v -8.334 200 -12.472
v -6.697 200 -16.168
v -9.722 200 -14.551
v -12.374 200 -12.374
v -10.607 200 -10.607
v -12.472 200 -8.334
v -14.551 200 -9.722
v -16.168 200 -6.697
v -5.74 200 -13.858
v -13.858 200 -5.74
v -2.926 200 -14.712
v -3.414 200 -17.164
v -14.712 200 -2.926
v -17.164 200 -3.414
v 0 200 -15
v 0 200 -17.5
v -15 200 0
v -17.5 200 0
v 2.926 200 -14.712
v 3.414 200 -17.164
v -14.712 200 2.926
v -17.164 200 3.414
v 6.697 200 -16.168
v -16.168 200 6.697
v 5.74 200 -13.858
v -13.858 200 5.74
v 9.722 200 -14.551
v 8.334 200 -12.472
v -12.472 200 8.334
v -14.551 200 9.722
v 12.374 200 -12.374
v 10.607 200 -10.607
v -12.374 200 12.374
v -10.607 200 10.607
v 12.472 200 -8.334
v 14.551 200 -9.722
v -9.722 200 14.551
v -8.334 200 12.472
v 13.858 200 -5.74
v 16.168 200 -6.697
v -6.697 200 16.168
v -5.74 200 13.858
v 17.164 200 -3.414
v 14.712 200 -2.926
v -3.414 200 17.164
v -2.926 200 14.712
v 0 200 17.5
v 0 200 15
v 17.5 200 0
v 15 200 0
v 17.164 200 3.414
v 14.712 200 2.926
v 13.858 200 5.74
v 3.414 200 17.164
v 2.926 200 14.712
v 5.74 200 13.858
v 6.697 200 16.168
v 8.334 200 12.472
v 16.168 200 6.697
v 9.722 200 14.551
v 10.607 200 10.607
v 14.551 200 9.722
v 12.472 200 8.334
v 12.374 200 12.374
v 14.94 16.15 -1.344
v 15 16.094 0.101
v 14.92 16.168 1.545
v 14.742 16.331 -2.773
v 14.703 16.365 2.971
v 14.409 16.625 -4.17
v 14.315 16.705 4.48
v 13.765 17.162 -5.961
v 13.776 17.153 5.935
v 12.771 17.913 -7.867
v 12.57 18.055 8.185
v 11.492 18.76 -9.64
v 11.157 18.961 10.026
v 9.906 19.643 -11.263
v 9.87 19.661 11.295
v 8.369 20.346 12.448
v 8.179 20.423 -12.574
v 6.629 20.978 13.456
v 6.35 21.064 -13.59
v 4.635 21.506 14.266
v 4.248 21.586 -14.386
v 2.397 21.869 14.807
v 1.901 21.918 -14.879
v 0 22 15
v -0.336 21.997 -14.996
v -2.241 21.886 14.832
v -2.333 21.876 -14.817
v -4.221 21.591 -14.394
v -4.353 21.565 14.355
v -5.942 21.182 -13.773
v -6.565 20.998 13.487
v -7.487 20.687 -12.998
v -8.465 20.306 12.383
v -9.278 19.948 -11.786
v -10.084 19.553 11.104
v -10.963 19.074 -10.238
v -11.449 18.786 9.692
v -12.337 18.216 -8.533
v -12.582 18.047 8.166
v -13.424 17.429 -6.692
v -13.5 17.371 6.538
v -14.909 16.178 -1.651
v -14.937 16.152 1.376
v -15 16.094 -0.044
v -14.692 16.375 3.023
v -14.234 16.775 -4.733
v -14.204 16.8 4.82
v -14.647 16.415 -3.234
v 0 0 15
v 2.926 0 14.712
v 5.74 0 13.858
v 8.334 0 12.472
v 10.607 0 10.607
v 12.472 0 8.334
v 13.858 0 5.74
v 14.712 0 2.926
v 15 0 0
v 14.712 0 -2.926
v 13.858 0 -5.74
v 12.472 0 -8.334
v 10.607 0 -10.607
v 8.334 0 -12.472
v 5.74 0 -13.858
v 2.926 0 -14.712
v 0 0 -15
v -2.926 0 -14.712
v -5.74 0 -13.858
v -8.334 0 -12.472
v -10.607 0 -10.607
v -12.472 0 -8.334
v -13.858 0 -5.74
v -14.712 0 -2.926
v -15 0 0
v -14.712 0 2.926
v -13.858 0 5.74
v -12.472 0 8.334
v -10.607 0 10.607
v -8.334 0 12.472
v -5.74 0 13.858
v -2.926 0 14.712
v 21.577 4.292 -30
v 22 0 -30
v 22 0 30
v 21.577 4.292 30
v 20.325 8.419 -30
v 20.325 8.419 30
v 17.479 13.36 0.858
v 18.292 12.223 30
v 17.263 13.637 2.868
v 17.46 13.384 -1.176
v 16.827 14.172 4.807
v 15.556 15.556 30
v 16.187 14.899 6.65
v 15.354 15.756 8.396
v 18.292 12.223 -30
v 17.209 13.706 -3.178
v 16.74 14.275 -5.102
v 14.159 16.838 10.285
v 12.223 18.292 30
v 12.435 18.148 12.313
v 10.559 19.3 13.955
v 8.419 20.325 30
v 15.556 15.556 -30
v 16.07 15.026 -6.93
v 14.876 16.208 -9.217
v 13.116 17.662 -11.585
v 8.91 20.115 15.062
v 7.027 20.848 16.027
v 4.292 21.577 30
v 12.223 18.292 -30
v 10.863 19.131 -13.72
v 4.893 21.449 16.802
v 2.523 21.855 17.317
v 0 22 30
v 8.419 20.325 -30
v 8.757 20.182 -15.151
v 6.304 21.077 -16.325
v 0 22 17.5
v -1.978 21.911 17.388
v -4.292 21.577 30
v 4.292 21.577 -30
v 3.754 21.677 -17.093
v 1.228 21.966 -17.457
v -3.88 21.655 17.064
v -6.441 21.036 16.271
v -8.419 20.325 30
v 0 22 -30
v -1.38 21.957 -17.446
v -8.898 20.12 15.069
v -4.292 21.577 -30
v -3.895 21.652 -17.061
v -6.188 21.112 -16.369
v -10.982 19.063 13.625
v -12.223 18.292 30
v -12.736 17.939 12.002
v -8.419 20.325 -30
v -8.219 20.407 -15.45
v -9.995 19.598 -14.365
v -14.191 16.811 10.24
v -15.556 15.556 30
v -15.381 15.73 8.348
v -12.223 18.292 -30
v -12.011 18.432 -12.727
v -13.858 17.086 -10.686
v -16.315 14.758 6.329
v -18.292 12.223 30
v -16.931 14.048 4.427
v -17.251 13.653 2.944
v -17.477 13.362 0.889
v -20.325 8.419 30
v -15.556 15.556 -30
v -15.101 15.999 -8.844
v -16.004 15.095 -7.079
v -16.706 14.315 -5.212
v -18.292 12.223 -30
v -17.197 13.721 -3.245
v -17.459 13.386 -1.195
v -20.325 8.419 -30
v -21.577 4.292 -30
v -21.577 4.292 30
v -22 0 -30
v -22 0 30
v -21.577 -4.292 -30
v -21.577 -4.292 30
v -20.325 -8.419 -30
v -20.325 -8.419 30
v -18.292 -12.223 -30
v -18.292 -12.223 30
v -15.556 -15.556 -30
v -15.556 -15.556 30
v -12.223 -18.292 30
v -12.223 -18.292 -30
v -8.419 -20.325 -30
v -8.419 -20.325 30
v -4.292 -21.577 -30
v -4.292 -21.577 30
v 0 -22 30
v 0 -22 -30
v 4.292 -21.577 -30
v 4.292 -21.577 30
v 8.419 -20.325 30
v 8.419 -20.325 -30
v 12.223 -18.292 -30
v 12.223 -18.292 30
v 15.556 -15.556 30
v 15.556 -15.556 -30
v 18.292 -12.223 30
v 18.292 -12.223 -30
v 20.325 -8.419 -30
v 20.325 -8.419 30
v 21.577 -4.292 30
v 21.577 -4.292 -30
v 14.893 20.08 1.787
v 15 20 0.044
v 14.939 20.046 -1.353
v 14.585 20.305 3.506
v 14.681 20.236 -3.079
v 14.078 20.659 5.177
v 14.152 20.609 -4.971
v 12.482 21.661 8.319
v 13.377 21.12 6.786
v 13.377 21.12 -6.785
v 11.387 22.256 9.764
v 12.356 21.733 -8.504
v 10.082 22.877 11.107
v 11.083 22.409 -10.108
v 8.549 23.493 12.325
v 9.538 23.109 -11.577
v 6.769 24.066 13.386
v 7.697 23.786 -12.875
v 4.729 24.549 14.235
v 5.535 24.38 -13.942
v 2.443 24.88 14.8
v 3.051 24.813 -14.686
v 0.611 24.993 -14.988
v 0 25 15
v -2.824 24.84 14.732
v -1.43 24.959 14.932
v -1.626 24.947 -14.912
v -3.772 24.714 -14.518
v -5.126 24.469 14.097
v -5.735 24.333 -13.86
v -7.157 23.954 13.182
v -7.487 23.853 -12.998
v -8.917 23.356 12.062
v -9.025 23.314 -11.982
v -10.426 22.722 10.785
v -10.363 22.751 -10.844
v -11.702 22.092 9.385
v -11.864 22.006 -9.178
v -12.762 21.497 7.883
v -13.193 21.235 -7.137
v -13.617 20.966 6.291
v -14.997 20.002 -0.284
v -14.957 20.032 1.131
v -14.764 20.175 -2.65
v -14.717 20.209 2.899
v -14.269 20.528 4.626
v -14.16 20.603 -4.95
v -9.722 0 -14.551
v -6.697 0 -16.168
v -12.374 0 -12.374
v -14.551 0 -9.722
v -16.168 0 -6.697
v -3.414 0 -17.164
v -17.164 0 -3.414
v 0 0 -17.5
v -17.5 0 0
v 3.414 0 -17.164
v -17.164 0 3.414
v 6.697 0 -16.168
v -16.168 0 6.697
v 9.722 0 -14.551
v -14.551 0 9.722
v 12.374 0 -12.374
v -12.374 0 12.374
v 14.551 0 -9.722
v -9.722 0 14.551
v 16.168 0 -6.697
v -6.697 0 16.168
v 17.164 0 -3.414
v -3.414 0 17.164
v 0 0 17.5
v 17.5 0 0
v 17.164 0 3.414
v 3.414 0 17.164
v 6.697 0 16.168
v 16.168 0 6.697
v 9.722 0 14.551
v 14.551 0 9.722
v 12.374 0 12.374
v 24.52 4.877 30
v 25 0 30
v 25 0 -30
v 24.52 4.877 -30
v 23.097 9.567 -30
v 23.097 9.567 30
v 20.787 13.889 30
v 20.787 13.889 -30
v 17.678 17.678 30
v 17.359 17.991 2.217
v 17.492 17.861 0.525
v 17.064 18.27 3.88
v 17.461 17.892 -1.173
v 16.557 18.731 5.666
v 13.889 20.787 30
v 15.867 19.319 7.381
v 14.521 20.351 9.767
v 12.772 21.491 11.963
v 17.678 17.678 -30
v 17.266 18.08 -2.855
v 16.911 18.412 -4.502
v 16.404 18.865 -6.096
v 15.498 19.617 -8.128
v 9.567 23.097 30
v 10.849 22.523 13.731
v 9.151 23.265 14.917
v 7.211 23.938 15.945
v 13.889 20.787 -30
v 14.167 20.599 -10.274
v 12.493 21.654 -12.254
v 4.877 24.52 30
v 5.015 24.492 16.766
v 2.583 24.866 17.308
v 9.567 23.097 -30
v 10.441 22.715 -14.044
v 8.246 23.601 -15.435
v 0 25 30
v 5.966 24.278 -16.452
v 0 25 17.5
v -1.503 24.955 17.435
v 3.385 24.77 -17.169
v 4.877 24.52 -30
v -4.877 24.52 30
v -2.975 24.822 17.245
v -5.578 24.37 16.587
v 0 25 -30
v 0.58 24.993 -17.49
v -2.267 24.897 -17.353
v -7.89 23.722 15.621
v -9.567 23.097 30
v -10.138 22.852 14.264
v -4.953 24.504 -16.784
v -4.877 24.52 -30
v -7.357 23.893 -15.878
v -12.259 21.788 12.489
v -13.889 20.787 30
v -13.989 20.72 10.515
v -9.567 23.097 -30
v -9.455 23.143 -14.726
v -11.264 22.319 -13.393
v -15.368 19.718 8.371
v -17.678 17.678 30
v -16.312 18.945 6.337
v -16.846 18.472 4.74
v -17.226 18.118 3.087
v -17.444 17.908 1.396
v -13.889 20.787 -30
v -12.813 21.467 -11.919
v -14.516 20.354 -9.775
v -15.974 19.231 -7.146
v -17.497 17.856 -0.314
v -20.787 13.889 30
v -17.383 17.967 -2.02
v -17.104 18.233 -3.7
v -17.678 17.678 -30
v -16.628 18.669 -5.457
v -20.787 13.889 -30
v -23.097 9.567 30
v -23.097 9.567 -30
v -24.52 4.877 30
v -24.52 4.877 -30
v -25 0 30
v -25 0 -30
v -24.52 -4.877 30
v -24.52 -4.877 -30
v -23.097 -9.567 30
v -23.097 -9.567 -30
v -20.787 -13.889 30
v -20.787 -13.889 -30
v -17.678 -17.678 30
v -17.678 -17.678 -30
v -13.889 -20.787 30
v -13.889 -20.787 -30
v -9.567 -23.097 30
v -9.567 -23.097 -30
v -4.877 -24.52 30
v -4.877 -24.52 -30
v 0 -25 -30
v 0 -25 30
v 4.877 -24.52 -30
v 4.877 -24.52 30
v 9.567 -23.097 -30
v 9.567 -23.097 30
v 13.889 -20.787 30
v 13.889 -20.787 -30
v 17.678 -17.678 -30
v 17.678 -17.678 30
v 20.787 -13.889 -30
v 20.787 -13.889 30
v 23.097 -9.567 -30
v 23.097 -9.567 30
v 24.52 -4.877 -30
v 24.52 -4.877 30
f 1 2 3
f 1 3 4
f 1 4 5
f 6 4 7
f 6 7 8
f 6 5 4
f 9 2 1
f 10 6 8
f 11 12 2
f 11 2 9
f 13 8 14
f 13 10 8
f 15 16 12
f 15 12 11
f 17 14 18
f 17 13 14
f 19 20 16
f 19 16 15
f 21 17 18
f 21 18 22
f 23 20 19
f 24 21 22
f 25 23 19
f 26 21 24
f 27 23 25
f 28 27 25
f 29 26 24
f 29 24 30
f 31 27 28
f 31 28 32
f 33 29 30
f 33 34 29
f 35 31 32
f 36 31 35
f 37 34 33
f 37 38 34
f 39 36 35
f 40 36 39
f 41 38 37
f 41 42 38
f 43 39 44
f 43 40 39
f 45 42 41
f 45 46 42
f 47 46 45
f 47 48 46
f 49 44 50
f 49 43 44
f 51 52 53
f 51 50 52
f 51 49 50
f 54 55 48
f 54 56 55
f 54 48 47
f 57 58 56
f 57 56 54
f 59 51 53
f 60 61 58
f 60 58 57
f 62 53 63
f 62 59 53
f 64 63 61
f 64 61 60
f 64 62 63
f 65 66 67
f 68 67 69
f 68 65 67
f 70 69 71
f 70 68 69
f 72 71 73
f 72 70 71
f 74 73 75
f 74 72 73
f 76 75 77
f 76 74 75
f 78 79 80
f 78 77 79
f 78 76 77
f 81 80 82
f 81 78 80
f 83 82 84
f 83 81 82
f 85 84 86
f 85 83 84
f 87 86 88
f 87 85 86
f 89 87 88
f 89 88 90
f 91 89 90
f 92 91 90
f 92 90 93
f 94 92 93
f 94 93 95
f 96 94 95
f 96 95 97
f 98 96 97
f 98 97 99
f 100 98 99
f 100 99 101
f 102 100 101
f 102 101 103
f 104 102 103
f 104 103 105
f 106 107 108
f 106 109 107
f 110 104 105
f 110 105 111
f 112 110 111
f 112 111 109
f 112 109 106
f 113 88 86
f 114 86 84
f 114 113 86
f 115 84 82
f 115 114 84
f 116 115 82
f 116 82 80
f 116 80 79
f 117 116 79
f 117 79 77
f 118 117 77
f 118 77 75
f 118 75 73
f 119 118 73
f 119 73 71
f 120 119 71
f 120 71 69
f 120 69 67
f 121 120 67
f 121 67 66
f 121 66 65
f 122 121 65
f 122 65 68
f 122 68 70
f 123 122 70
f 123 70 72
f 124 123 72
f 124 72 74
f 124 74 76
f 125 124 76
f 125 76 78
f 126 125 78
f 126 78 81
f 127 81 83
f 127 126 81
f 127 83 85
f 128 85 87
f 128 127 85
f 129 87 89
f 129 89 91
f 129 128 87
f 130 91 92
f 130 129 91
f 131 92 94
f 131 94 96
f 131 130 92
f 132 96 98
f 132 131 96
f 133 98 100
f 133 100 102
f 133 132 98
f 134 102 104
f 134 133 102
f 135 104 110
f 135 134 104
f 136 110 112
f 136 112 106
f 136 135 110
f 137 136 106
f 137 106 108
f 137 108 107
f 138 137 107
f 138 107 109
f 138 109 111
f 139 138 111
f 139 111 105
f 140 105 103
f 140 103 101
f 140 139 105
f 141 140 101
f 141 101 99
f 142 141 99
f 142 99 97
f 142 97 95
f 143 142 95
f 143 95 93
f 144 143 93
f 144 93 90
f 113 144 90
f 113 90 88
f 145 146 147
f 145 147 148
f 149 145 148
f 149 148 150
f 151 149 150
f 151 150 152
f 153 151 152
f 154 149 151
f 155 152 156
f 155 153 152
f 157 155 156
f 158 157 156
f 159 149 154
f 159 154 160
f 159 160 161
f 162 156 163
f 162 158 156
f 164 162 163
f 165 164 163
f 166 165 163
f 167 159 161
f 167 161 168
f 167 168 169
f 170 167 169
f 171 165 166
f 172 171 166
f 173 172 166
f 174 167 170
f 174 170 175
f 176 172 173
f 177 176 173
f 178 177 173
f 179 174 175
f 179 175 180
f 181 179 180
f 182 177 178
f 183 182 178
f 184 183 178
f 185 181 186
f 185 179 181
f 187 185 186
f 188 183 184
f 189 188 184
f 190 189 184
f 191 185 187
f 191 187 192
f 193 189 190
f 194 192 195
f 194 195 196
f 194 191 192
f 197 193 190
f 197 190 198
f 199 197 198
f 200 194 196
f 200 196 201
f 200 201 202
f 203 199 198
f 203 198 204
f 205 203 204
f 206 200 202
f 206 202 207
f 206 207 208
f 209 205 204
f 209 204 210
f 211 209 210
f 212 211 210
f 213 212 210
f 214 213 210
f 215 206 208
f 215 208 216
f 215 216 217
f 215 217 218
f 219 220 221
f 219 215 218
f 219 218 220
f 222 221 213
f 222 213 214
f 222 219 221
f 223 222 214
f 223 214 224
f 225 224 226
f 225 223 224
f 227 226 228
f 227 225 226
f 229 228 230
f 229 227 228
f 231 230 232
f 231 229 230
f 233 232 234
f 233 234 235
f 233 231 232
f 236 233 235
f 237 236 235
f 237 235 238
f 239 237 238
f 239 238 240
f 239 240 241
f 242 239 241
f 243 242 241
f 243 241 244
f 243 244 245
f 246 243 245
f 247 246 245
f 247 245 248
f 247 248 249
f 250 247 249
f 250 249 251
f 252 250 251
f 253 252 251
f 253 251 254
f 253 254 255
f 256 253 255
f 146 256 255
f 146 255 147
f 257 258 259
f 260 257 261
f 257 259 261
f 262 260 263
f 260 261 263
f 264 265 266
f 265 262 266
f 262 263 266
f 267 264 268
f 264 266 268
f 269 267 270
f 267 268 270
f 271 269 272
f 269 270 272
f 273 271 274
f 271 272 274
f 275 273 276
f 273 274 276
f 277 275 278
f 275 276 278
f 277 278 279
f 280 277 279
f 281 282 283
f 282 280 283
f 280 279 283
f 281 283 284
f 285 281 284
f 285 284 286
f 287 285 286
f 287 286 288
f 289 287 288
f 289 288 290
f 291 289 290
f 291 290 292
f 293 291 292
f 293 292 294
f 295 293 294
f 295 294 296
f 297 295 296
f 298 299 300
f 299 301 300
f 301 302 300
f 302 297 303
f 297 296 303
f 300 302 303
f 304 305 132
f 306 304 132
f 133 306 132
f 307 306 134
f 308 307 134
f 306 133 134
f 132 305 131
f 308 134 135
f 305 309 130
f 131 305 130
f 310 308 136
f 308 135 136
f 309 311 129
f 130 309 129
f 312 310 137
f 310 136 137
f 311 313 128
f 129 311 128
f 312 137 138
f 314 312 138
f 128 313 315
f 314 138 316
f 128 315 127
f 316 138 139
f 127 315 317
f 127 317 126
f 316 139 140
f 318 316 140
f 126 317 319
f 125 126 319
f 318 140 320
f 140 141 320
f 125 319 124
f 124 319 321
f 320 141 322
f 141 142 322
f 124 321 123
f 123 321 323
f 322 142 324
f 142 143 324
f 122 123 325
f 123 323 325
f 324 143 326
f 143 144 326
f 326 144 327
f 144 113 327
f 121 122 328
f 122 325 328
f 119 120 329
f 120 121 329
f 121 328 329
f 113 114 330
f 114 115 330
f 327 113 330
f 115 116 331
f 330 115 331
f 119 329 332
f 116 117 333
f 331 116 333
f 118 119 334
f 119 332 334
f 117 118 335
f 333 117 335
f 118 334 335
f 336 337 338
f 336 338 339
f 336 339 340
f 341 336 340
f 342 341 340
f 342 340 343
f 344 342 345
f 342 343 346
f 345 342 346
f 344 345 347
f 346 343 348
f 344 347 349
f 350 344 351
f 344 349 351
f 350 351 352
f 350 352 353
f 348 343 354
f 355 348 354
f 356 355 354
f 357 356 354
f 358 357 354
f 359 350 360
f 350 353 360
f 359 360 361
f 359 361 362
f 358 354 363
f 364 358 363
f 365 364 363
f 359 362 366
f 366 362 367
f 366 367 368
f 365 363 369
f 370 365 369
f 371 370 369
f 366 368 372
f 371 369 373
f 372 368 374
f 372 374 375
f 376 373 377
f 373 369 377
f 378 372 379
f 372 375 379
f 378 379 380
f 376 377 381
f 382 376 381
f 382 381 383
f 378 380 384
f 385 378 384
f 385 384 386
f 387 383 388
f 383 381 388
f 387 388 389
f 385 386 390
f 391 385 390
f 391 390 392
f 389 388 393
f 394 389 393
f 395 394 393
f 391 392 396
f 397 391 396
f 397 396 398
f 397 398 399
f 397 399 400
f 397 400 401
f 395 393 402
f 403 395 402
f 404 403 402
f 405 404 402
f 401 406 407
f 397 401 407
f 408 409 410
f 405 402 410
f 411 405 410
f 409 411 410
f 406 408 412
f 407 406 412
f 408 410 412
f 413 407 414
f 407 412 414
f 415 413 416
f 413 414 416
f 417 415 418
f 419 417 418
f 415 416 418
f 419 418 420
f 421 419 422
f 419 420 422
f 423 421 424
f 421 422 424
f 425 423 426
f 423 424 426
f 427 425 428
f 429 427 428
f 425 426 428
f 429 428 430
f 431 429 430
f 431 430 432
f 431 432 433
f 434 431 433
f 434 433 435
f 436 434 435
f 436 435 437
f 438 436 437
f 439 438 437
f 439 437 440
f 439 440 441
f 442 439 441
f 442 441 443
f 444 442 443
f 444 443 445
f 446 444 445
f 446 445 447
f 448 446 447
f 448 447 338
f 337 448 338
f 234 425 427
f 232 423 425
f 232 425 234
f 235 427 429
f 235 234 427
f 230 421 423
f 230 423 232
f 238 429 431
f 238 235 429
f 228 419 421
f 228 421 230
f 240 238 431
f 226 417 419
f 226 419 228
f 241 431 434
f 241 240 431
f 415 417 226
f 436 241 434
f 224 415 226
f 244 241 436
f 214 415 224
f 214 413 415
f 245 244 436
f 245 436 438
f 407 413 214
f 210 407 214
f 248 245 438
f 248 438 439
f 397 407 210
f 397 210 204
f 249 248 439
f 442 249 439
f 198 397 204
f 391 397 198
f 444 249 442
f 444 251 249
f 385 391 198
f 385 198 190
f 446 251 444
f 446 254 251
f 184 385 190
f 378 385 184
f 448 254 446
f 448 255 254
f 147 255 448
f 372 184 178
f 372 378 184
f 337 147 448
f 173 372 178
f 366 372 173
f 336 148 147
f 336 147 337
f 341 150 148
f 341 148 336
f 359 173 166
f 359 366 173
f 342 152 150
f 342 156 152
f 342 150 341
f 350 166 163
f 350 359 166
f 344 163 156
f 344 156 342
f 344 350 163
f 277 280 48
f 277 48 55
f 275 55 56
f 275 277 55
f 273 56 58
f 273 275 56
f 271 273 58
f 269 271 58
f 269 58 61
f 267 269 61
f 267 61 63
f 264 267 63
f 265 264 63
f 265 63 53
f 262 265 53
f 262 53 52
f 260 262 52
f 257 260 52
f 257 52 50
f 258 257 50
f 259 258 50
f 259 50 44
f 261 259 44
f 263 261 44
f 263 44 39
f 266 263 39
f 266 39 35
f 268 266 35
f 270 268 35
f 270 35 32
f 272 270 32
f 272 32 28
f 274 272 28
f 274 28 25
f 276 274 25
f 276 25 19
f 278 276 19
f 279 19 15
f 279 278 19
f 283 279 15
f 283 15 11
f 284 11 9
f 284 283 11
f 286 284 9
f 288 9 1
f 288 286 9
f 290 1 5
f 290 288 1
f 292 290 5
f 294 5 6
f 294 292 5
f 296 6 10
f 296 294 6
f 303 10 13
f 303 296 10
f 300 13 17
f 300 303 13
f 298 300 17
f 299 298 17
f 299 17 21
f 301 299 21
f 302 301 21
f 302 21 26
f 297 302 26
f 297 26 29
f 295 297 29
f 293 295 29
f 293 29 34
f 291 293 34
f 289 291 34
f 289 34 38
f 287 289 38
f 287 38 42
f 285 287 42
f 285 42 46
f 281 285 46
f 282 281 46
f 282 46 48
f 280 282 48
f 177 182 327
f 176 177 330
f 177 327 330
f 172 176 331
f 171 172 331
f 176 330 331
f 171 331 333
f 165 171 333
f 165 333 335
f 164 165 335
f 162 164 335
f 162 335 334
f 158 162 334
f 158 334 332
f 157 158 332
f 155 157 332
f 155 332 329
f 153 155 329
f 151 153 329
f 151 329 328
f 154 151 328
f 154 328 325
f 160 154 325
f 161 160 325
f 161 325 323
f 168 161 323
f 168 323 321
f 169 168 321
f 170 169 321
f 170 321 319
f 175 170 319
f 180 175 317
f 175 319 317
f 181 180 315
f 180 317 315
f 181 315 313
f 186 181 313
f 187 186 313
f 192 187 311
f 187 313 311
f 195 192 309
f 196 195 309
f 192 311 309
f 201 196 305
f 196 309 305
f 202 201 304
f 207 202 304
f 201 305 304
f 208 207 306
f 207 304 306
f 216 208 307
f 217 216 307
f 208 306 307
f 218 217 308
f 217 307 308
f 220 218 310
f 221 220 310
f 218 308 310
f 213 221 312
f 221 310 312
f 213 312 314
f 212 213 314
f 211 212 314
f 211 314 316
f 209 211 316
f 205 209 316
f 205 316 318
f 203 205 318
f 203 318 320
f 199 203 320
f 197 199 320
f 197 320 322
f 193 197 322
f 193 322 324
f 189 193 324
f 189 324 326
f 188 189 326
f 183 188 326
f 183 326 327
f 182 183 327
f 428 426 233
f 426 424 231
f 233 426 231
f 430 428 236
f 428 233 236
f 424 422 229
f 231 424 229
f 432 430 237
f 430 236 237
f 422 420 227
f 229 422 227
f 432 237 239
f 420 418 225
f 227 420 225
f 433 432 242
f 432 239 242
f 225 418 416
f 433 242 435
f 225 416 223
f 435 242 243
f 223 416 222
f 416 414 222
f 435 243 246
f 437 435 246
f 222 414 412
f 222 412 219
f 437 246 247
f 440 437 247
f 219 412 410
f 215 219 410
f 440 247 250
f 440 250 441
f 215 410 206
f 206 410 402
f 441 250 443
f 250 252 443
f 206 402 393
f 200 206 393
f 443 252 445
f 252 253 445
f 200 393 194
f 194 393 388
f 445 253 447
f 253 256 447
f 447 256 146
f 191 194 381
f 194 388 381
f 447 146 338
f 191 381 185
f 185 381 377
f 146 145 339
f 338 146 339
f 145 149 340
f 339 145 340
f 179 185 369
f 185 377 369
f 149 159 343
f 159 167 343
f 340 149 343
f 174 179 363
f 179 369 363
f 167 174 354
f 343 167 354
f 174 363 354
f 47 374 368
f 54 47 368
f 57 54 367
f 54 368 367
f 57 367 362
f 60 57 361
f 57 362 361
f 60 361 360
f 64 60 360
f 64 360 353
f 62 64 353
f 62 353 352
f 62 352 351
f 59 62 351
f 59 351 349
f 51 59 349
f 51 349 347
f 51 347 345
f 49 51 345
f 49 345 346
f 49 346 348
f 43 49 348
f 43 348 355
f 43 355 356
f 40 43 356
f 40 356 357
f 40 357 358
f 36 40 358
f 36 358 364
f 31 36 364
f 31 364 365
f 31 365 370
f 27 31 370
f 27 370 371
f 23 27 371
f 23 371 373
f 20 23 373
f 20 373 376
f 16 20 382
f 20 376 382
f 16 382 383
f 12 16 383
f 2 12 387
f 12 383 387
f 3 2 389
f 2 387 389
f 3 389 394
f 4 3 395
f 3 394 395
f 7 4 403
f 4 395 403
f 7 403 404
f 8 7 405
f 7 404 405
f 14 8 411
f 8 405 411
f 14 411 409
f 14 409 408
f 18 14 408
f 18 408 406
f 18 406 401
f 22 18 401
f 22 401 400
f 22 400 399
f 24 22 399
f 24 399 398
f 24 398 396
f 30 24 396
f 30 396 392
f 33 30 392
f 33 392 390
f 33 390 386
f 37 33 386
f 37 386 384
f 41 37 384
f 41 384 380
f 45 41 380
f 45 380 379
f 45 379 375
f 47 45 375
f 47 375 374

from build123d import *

# Parameters (mm, degrees)
IZIM1_R                          = 17.5
IZIM1_R_2                        = 15
Y_KSEKLIK_EKSTR_ZYON1_DEPTH      = 200
Y_KSEKLIK_EKSTR_ZYON2_DEPTH      = 30
Y_KSEKLIK_EKSTR_ZYON2_DEPTH_BACK = 30
IZIM2_R                          = 25
IZIM2_R_2                        = 22


with BuildPart() as part:
    # Çizim1 → Yükseklik-Ekstrüzyon1 (new body)
    with BuildSketch(Plane(origin=(0, 0, 0), x_dir=(1, 0, 0), z_dir=(0, 1, 0))):
        Circle(IZIM1_R)
        Circle(IZIM1_R_2, mode=Mode.SUBTRACT)
    extrude(amount=Y_KSEKLIK_EKSTR_ZYON1_DEPTH)

    # Çizim2 → Yükseklik-Ekstrüzyon2 (add, two sides: drawn at the far end of the back side and taken through both)
    with BuildSketch(Plane.XY.offset(-Y_KSEKLIK_EKSTR_ZYON2_DEPTH_BACK)):
        Circle(IZIM2_R)
        Circle(IZIM2_R_2, mode=Mode.SUBTRACT)
    extrude(amount=Y_KSEKLIK_EKSTR_ZYON2_DEPTH + Y_KSEKLIK_EKSTR_ZYON2_DEPTH_BACK)


solid = part.part
